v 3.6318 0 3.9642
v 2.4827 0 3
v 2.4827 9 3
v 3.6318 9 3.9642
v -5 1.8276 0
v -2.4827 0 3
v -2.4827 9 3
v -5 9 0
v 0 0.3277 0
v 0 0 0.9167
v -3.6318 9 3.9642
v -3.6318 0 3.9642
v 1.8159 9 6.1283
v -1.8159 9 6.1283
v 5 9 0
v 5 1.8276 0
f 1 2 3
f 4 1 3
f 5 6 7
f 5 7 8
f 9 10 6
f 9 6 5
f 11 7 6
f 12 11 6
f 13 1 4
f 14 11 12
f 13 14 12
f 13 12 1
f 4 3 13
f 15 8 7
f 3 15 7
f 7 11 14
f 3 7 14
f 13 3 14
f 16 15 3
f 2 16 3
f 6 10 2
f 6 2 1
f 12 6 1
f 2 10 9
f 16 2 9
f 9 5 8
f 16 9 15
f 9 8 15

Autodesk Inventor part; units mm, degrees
ref_plane "YZ Plane" through (0, 0, 0) normal (1, 0, 0) x (0, 1, 0)
ref_plane "XZ Plane" through (0, 0, 0) normal (0, 1, 0) x (-1, 0, 0)
sketch "スケッチ1" plane through (0, 0, 0) normal (0, 0, 1) x (1, 0, 0)
  line L0 (-5, 9) -> (5, 9)
  line L1 (5, 9) -> (5, 0)
  line L2 (5, 0) -> (-5, 0)
  line L3 (-5, 0) -> (-5, 9)
  line L4 (-8.0749, 9) -> (-5, 9) construction
  point P0 (0, 0)
  point P1 (0, 9)
  point P2 (0, 0)
  dimension "d0" = 9
  dimension "d1" = 10
  dimension "d2" = 10
extrude "押し出し1" add sketch "スケッチ1" along normal blind 3
sketch "スケッチ2" plane through (-5, 9, 0) normal (0, 1, 0) x (1, 0, 0)
  line L0 (0, -3) -> (10, -3) projected
  line L1 (0, 0) -> (10, 0) projected
  line L2 (2.5173, -3) -> (0, 0)
  line L3 (10, 0) -> (7.4827, -3)
  line L4 (0, 0) -> (0, -3) projected
  line L5 (10, 0) -> (10, -3) projected
  point P0 (5, 0)
  dimension "d5" = 80
  dimension "d6" = 40
  dimension "d7" = 40
extrude "押し出し2" cut sketch "スケッチ2" against normal through all contours L4 L2 L0 | L3 L5 L0
sketch "スケッチ3" plane through (-5, 0, 0) normal (-0.7660444, 0, 0.6427876) x (0.6427876, 0, 0.7660444)
  line L0 (3.9162, 0) -> (0, 0) projected
  line L1 (3.9162, 9) -> (3.9162, 0) projected
  line L2 (0, 9) -> (3.9162, 9) projected
  line L3 (0, 9) -> (0, 0) projected
  line L4 (3.9162, 0) -> (7.1079, 0) projected
  line L5 (3.9162, 0) -> (-11.0838, 7)
  point P0 (3.2139, 0)
  point P1 (0, 1.8276)
  dimension "d10" = 15
  dimension "d11" = 7
extrude "押し出し3" cut sketch "スケッチ3" against normal through all contours L0 L3 L5
sketch "スケッチ4" plane through (5, 0, 0) normal (0.7660444, 0, 0.6427876) x (0.6427876, 0, -0.7660444)
  line L0 (0, 0) -> (-3.9162, 0) projected
  line L1 (0, 0) -> (0, 9) projected
  line L2 (-3.9162, 9) -> (0, 9) projected
  line L3 (-3.9162, 0) -> (-3.9162, 9) projected
  line L4 (-3.9162, 0) -> (11.0838, 7)
  point P0 (-3.2139, 0)
  point P1 (0, 1.8276)
  dimension "d14" = 15
  dimension "d15" = 7
extrude "押し出し4" cut sketch "スケッチ4" against normal through all contours L0 L4 L1
sketch "スケッチ5" plane through (0, 0, 3) normal (0, 0, 1) x (1, 0, 0)
  line L0 (-2.4827, 9) -> (-2.4827, 0) projected
  line L1 (-2.4827, 0) -> (2.4827, 0) projected
  line L2 (2.4827, 0) -> (2.4827, 9) projected
  line L3 (2.4827, 9) -> (-2.4827, 9) projected
  point P0 (0, 0)
extrude "押し出し5" add sketch "スケッチ5" along normal blind 10
sketch "スケッチ6" plane through (-2.4827, 0, 3) normal (-1, 0, 0) x (0, 0, 1)
  line L0 (0, 9) -> (0, 0) projected
  line L1 (0, 0) -> (10, 0) projected
  line L2 (10, 9) -> (10, 0) projected
  line L3 (0, 9) -> (10, 9) projected
  point P0 (-3, 0)
extrude "押し出し6" add sketch "スケッチ6" along normal blind 10
sketch "スケッチ7" plane through (2.4827, 0, 3) normal (1, 0, 0) x (0, 0, -1)
  line L0 (0, 0) -> (0, 9) projected
  line L1 (0, 9) -> (-10, 9) projected
  line L2 (-10, 0) -> (-10, 9) projected
  line L3 (0, 0) -> (-10, 0) projected
  point P0 (3, 0)
extrude "押し出し7" add sketch "スケッチ7" along normal blind 10
sketch "スケッチ8" plane through (5, 1.8276, 0) normal (0.7660444, 0, 0.6427876) x (0.6427876, 0, -0.7660444)
  line L0 (-7.1079, 7.1724) -> (-7.1079, -1.8276) projected
  line L1 (-3.9162, -1.8276) -> (0, 0) projected
  line L2 (0, 0) -> (0, 7.1724) projected
  line L3 (-3.9162, 7.1724) -> (0, 7.1724) projected
  line L4 (-3.9162, -1.8276) -> (-3.9162, 7.1724) projected
  line L5 (-3.9162, 20) -> (16.0838, 20)
  line L6 (16.0838, 20) -> (16.0838, -10)
  line L7 (16.0838, -10) -> (-3.9162, -10)
  line L8 (-3.9162, -10) -> (-3.9162, 20)
  point P0 (-3.2139, -1.8276)
  point P1 (-3.9162, -1.8276)
  point P2 (-3.9162, 7.1724)
extrude "押し出し8" cut sketch "スケッチ8" along normal through all
sketch "スケッチ9" plane through (-5, 1.8276, 0) normal (-0.7660444, 0, 0.6427876) x (0.6427876, 0, 0.7660444)
  line L0 (0, 0) -> (3.9162, -1.8276) projected
  line L1 (3.9162, 7.1724) -> (3.9162, -1.8276) projected
  line L2 (0, 7.1724) -> (3.9162, 7.1724) projected
  line L3 (0, 7.1724) -> (0, 0) projected
  line L4 (-16.0838, 20) -> (3.9162, 20)
  line L5 (3.9162, 20) -> (3.9162, -20)
  line L6 (3.9162, -20) -> (-16.0838, -20)
  line L7 (-16.0838, -20) -> (-16.0838, 20)
  point P0 (3.2139, -1.8276)
  point P1 (3.9162, 7.1724)
  point P2 (3.9162, -1.8276)
extrude "押し出し9" cut sketch "スケッチ9" along normal through all
sketch "スケッチ10" plane through (2.4827, 0, 3) normal (0.6427876, 0, -0.7660444) x (-0.7660444, 0, -0.6427876)
  line L0 (-13.0541, 9) -> (0, 9) projected
  line L1 (0, 0) -> (0, 9) projected
  line L2 (-1.5, 9) -> (0, 9)
  line L3 (0, 9) -> (0, 0)
  line L4 (0, 0) -> (-1.5, 0)
  line L5 (-1.5, 0) -> (-1.5, 9)
  line L6 (-13.0541, 9) -> (0, 9) projected
  line L7 (-13.0541, 0) -> (-13.0541, 9) projected
  line L8 (0, 0) -> (-13.0541, 0) projected
  line L9 (0, 0) -> (0, 9) projected
  line L10 (-20, 9) -> (-13.0541, 9)
  line L11 (-13.0541, 9) -> (-13.0541, 0)
  line L12 (-13.0541, 0) -> (-20, 0)
  line L13 (-20, 0) -> (-20, 9)
  line L14 (-13.0541, 0) -> (-13.0541, 9) projected
  line L15 (0, 0) -> (-13.0541, 0) projected
  point P0 (3.8302, 0)
  point P1 (-1.5, 0)
  dimension "d28" = 1.5
extrude "押し出し10" cut sketch "スケッチ10" against normal through all contours L0 L5 L8 L7 | L7 L12 L13 L10
sketch "スケッチ11" plane through (-2.4827, 0, 3) normal (-0.6427876, 0, -0.7660444) x (-0.7660444, 0, 0.6427876)
  line L0 (-7.6604, 9) -> (0, 9) projected
  line L1 (-4.0642, 0) -> (7.552, 0) projected
  line L2 (0, 9) -> (1.5, 9)
  line L3 (1.5, 9) -> (1.5, 0)
  line L4 (1.5, 0) -> (0, 0)
  line L5 (0, 0) -> (0, 9)
  line L6 (1.5, 9) -> (20, 9)
  line L7 (20, 9) -> (20, 0)
  line L8 (20, 0) -> (1.5, 0)
  line L9 (1.5, 0) -> (1.5, 9)
  line L10 (13.0541, 0) -> (0, 0) projected
  point P0 (-3.8302, 0)
  dimension "d31" = 1.5
extrude "押し出し11" cut sketch "スケッチ11" against normal through all contours L3 L6 L7 L8 L1
ref_plane "作業平面1" through (-1.8159, 9, 6.1283) normal (0, 0.2337903, -0.972287) x (1, 0, 0)
sketch "スケッチ12" plane through (-1.8159, 9, 6.1283) normal (0, 0.2337903, -0.972287) x (1, 0, 0)
  line L0 (-10, -6.5677) -> (20, -6.5677)
  line L1 (20, -6.5677) -> (20, 15.9547)
  line L2 (20, 15.9547) -> (-10, 15.9547)
  line L3 (-10, 15.9547) -> (-10, -6.5677)
  point P0 (1.8159, 10.1833)
extrude "押し出し12" cut sketch "スケッチ12" against normal through all
equation "\"d6\" = d7"
properties part number "antana_middle_ex"
